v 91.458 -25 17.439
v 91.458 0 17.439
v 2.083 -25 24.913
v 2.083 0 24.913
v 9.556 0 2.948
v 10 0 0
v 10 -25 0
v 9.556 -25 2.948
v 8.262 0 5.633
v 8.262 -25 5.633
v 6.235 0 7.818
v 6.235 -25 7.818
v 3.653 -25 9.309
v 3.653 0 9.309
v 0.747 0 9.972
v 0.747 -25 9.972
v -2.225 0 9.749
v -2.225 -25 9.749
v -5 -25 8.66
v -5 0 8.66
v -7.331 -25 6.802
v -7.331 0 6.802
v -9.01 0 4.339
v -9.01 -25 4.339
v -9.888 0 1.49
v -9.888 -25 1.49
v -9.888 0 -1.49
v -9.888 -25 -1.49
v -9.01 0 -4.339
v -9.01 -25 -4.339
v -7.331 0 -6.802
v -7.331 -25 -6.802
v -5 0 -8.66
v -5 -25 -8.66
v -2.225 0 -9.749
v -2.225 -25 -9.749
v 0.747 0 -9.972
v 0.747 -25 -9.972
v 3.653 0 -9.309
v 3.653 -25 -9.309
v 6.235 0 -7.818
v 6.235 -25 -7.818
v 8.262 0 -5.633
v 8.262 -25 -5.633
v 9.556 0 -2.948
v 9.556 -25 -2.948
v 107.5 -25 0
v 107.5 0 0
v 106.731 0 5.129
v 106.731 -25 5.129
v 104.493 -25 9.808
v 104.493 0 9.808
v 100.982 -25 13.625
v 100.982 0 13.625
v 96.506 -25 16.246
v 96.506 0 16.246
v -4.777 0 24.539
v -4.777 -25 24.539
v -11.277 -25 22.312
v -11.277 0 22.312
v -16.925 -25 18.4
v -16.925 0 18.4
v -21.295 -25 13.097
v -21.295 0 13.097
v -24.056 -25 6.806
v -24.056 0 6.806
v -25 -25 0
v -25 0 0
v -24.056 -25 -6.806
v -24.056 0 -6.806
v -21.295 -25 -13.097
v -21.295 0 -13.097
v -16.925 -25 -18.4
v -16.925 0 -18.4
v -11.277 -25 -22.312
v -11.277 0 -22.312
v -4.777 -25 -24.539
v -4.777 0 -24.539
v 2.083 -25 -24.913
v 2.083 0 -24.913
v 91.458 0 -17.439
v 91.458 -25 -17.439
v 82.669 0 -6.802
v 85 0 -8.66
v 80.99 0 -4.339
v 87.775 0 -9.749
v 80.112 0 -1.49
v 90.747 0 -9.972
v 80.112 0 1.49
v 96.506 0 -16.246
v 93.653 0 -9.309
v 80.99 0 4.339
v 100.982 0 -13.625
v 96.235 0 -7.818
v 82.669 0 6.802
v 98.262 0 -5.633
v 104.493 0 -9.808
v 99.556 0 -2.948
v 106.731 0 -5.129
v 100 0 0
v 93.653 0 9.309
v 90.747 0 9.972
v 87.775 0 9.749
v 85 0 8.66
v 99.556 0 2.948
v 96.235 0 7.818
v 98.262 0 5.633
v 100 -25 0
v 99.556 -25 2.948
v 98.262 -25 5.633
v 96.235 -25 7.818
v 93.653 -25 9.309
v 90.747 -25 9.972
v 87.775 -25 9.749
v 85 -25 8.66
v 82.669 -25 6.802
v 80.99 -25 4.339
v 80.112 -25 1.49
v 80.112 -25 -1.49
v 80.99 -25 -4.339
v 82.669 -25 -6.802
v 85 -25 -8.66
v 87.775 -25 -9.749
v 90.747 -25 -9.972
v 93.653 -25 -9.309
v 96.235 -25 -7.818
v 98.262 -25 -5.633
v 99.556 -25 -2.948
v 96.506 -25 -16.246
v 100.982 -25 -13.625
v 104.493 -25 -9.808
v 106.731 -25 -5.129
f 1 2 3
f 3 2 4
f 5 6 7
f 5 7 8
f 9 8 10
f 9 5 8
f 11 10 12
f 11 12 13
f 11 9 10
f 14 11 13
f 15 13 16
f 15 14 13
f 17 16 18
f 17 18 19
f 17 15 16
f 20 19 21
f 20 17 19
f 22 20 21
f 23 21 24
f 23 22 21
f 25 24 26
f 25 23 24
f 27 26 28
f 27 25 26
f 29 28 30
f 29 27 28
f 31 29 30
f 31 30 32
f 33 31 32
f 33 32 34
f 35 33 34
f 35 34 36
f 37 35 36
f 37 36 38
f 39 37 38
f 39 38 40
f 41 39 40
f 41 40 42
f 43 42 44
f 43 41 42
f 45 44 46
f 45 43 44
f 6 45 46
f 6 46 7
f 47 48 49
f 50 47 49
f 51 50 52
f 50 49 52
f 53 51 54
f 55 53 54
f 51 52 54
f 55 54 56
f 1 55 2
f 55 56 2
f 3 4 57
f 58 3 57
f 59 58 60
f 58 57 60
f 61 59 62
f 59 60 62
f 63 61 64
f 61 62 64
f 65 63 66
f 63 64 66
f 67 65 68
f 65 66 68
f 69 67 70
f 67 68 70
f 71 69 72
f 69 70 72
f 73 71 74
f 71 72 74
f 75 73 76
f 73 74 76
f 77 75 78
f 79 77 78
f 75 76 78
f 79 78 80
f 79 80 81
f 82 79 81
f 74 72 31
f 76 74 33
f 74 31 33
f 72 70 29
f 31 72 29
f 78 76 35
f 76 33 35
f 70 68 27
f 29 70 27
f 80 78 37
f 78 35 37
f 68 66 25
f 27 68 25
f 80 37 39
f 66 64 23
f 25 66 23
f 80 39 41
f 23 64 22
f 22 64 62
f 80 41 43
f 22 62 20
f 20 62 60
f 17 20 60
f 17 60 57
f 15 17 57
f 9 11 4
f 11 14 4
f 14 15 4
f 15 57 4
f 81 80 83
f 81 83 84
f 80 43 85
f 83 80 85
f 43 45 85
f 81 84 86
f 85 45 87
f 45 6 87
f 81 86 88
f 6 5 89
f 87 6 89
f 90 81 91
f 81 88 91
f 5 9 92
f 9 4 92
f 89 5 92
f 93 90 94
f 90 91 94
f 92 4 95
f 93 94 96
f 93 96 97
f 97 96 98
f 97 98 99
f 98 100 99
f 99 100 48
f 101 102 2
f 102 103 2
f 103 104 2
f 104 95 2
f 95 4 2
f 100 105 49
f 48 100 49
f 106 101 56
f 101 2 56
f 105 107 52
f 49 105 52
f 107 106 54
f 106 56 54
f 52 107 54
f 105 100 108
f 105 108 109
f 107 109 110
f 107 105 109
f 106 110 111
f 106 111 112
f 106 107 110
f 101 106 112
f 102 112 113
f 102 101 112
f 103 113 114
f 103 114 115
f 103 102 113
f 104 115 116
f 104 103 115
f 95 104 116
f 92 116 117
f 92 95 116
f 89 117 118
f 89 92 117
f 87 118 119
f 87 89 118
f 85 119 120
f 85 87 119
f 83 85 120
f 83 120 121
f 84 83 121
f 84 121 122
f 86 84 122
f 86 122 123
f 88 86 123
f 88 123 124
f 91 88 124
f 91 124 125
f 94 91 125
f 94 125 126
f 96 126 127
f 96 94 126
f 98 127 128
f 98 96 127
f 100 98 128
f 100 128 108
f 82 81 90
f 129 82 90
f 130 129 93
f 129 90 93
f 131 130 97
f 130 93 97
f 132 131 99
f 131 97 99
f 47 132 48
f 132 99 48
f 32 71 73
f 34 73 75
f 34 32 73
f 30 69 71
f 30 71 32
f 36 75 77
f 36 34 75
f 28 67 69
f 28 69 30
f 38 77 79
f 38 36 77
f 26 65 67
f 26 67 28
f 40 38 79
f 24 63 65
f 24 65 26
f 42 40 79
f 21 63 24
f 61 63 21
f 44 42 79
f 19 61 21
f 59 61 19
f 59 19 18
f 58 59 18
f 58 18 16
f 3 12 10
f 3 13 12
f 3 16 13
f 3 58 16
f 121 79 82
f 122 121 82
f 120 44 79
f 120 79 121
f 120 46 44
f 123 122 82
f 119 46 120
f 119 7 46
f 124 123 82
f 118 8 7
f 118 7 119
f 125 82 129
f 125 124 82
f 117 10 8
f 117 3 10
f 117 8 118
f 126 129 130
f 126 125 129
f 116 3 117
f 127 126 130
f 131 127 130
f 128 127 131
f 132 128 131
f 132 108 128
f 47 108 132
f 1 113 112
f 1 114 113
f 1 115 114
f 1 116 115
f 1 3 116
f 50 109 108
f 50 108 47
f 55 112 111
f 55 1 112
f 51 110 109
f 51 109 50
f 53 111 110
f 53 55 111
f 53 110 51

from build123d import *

# Parameters (mm, degrees)
F0_R     = 10
F1_DEPTH = 25


with BuildPart() as f1:
    # F0 (on Front) → F1 (new body)
    with BuildSketch(Plane.XZ):
        with BuildLine():
            ThreePointArc((107.5, 0), (102.879651, 11.847556), (91.458333, 17.43913))
            ThreePointArc((91.458333, 17.43913), (72.5, 0), (91.458333, -17.43913))
            ThreePointArc((91.458333, -17.43913), (102.879651, -11.847556), (107.5, 0))
        make_face()
        with Locations((90, 0)):
            Circle(F0_R, mode=Mode.SUBTRACT)
        with BuildLine():
            ThreePointArc((2.083333, 24.913043), (18.399502, 16.92508), (25, 0))
            ThreePointArc((25, 0), (18.399502, -16.92508), (2.083333, -24.913043))
            Line((2.083333, -24.913043), (91.458333, -17.43913))
            ThreePointArc((91.458333, -17.43913), (72.5, 0), (91.458333, 17.43913))
            Line((91.458333, 17.43913), (2.083333, 24.913043))
        make_face()
        with BuildLine():
            ThreePointArc((2.083333, -24.913043), (18.399502, -16.92508), (25, 0))
            ThreePointArc((25, 0), (18.399502, 16.92508), (2.083333, 24.913043))
            ThreePointArc((2.083333, 24.913043), (-25, 0), (2.083333, -24.913043))
        make_face()
        Circle(F0_R, mode=Mode.SUBTRACT)
    extrude(amount=F1_DEPTH)


solid = f1.part
